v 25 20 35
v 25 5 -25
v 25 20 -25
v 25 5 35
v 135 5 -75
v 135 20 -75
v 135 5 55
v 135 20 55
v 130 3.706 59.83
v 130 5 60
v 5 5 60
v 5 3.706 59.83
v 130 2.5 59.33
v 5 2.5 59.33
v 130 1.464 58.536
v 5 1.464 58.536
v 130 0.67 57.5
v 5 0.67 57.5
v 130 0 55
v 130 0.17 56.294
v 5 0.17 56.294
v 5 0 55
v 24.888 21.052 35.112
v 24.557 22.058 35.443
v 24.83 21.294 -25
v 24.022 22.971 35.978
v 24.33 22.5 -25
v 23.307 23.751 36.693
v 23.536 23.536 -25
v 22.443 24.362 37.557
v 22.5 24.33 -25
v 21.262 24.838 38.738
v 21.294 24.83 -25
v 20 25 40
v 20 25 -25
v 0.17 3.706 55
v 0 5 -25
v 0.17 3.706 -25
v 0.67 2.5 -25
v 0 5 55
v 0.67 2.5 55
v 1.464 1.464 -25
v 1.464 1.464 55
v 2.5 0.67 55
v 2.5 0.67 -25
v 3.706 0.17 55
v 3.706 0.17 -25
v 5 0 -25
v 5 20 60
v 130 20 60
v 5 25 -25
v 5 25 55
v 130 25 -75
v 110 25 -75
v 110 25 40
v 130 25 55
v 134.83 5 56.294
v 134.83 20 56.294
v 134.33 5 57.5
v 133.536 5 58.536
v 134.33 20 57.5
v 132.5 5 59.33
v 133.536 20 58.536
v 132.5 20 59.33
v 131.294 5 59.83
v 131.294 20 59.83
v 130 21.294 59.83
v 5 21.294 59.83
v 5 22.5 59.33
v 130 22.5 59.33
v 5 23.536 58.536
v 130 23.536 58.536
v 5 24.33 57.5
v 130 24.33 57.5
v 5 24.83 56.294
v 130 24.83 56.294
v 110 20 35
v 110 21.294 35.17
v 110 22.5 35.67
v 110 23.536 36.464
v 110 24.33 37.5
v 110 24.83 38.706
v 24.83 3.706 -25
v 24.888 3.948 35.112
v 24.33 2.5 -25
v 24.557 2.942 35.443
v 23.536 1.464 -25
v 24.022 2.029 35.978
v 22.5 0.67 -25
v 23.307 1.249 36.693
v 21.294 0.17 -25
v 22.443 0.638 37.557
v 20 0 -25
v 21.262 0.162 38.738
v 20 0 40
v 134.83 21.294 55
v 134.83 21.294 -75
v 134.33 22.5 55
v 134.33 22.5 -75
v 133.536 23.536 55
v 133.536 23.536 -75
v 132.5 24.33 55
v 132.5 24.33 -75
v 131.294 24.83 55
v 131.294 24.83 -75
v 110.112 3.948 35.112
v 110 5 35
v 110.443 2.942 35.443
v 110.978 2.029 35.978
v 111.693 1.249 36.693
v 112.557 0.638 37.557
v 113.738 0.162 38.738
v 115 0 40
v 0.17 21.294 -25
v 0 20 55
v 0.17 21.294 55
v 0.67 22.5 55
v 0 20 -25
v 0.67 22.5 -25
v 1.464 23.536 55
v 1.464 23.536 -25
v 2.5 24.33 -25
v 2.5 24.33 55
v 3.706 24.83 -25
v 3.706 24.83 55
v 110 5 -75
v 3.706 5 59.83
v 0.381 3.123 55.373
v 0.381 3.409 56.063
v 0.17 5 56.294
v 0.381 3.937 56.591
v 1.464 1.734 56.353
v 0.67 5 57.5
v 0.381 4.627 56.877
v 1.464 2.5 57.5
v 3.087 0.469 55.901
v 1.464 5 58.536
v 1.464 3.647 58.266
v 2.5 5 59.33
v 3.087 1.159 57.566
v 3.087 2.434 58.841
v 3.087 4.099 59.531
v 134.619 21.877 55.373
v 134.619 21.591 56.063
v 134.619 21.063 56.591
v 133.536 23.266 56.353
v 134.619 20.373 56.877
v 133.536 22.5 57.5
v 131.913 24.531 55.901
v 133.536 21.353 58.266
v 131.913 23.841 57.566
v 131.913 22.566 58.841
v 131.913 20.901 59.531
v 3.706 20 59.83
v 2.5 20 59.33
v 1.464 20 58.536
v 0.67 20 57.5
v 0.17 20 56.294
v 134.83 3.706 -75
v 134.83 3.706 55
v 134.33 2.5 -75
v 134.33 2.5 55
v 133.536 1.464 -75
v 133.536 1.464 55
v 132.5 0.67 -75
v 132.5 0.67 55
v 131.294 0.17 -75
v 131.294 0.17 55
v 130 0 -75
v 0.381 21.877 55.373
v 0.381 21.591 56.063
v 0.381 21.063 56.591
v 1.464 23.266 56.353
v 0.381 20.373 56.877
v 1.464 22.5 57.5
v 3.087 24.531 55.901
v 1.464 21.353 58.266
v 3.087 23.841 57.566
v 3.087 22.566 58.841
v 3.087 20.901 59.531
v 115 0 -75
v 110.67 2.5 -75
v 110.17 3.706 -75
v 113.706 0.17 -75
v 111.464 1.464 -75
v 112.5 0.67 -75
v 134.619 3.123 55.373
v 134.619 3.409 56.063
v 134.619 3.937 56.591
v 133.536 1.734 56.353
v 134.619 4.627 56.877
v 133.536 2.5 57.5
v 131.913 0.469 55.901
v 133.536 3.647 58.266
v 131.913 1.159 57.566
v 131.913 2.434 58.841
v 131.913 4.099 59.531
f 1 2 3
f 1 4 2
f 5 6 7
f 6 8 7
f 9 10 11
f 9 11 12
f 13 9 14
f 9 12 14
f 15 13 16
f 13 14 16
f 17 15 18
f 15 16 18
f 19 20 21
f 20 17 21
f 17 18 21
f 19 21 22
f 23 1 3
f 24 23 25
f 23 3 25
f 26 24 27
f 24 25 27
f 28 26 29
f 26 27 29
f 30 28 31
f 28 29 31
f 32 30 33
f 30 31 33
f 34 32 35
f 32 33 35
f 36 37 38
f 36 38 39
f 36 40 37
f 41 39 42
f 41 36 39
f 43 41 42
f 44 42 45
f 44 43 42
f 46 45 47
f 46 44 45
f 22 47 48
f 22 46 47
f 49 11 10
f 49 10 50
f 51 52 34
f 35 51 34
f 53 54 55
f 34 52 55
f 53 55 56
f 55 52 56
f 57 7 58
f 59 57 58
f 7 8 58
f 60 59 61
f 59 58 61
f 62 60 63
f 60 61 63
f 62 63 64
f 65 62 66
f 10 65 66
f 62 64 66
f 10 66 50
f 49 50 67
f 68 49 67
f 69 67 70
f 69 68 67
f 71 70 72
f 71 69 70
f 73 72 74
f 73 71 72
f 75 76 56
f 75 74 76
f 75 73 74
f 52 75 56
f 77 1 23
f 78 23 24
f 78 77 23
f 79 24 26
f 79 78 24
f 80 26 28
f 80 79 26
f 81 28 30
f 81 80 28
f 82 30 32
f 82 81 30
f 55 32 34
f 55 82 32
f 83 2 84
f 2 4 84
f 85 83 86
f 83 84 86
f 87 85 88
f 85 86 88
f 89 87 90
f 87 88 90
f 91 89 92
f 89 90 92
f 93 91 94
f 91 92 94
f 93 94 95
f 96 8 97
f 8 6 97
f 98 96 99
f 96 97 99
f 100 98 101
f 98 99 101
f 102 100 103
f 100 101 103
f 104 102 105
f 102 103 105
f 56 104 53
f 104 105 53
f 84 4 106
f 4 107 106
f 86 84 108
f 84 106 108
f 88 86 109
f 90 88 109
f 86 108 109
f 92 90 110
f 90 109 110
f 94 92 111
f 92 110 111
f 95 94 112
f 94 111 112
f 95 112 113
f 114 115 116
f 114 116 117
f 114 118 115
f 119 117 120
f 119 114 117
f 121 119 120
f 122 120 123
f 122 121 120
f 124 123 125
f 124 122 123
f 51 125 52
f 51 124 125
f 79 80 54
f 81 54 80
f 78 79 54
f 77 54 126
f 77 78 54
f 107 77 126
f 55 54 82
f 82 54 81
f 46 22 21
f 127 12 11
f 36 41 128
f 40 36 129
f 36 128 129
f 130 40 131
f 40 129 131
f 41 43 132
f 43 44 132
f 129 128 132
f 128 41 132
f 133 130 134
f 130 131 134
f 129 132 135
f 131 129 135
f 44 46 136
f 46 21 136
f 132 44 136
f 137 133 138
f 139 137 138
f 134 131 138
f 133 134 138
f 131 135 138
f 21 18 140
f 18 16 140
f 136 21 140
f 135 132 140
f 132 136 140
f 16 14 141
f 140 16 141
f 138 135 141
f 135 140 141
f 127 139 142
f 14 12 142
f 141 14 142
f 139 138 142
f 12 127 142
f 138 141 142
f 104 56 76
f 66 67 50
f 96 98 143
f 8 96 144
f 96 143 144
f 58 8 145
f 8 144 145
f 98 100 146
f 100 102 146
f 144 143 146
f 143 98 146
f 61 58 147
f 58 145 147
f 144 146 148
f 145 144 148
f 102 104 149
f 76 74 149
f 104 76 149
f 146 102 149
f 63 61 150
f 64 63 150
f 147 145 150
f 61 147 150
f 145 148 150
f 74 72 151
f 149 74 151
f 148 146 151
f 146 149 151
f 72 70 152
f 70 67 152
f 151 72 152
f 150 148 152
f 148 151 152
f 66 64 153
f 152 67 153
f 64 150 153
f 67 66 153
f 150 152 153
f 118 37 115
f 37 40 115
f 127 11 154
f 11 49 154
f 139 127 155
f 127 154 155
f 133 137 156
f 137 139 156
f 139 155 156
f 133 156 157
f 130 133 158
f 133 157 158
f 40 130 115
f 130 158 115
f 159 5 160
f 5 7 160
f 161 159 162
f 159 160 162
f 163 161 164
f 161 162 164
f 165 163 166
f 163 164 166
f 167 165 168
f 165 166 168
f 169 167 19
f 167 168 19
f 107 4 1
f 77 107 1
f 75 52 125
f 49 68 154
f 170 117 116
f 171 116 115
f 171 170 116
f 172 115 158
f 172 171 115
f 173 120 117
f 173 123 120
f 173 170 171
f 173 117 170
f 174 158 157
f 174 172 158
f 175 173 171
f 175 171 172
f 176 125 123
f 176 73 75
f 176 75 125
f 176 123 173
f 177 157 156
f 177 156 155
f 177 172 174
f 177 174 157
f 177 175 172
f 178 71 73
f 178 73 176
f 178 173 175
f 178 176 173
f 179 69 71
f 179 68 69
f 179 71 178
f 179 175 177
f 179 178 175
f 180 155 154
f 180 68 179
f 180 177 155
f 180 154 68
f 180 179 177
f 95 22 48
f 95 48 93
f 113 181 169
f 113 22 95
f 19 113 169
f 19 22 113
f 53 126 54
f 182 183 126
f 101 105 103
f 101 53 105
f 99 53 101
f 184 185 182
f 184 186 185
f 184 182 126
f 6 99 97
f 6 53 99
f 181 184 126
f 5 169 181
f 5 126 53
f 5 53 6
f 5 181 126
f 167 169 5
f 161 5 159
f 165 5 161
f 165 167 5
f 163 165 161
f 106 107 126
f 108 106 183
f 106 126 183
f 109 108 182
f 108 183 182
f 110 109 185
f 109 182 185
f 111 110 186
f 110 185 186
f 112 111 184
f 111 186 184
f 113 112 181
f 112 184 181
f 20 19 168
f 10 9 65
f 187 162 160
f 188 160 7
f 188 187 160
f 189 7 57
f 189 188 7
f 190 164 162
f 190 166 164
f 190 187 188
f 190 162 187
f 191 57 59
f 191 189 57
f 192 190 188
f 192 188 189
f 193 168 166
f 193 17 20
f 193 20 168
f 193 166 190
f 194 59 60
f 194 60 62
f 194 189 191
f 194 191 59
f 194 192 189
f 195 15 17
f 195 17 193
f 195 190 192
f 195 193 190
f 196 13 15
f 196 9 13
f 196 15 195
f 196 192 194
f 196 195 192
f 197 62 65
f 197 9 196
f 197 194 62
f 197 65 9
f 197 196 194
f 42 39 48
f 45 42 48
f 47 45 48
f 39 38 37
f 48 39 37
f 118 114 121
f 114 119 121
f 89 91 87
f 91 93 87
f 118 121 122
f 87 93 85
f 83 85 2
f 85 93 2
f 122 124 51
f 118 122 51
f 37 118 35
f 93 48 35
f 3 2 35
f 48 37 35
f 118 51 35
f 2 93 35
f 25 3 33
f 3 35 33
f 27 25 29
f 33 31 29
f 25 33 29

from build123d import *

# Parameters (mm, degrees)
F0_W     = 25
F0_H     = 25
F1_DEPTH = 60
F2_W     = 25
F2_H     = 25
F3_DEPTH = 60
F4_DEPTH = 25
F5_DEPTH = 50
F6_W     = 25
F6_H     = 25
F7_DEPTH = 110
F8_R     = 5


with BuildPart() as f1:
    # F0 (on Top) → F1 (new body)
    with BuildSketch(Plane.XY):
        with Locations((12.5, 12.5)):
            Rectangle(F0_W, F0_H)
    extrude(amount=F1_DEPTH)

    # F2 (on face) → F3 (join)
    with BuildSketch(Plane.YZ.offset(25)):
        with Locations((12.5, 47.5)):
            Rectangle(F2_W, F2_H)
    extrude(amount=F3_DEPTH)

    # F4 (add): a face of the model
    f4_faces = [f1.faces().sort_by_distance(p)[0] for p in [
        (12.5, 12.5, 0),
    ]]
    extrude(f4_faces, amount=F4_DEPTH)

    # F5 (add): a face of the model
    f5_faces = [f1.faces().sort_by_distance(p)[0] for p in [
        (85, 12.5, 47.5),
    ]]
    extrude(f5_faces, amount=F5_DEPTH)

    # F6 (on face) → F7 (join)
    with BuildSketch(Plane(origin=(0, 0, 35), x_dir=(1, 0, 0), z_dir=(0, 0, -1))):
        with Locations((122.5, -12.5)):
            Rectangle(F6_W, F6_H)
    extrude(amount=F7_DEPTH)

    # F8
    f8_edges = [f1.edges().sort_by_distance(p)[0] for p in [
        (67.5, 0, 60),
        (67.5, 25, 60),
        (25, 0, 5),
        (25, 25, 5),
        (0, 0, 17.5),
        (0, 25, 17.5),
        (67.5, 0, 35),
        (135, 0, -7.5),
        (135, 25, -7.5),
        (135, 12.5, 60),
        (0, 12.5, 60),
        (67.5, 25, 35),
        (110, 0, -20),
    ]]
    fillet(f8_edges, radius=F8_R)


solid = f1.part
